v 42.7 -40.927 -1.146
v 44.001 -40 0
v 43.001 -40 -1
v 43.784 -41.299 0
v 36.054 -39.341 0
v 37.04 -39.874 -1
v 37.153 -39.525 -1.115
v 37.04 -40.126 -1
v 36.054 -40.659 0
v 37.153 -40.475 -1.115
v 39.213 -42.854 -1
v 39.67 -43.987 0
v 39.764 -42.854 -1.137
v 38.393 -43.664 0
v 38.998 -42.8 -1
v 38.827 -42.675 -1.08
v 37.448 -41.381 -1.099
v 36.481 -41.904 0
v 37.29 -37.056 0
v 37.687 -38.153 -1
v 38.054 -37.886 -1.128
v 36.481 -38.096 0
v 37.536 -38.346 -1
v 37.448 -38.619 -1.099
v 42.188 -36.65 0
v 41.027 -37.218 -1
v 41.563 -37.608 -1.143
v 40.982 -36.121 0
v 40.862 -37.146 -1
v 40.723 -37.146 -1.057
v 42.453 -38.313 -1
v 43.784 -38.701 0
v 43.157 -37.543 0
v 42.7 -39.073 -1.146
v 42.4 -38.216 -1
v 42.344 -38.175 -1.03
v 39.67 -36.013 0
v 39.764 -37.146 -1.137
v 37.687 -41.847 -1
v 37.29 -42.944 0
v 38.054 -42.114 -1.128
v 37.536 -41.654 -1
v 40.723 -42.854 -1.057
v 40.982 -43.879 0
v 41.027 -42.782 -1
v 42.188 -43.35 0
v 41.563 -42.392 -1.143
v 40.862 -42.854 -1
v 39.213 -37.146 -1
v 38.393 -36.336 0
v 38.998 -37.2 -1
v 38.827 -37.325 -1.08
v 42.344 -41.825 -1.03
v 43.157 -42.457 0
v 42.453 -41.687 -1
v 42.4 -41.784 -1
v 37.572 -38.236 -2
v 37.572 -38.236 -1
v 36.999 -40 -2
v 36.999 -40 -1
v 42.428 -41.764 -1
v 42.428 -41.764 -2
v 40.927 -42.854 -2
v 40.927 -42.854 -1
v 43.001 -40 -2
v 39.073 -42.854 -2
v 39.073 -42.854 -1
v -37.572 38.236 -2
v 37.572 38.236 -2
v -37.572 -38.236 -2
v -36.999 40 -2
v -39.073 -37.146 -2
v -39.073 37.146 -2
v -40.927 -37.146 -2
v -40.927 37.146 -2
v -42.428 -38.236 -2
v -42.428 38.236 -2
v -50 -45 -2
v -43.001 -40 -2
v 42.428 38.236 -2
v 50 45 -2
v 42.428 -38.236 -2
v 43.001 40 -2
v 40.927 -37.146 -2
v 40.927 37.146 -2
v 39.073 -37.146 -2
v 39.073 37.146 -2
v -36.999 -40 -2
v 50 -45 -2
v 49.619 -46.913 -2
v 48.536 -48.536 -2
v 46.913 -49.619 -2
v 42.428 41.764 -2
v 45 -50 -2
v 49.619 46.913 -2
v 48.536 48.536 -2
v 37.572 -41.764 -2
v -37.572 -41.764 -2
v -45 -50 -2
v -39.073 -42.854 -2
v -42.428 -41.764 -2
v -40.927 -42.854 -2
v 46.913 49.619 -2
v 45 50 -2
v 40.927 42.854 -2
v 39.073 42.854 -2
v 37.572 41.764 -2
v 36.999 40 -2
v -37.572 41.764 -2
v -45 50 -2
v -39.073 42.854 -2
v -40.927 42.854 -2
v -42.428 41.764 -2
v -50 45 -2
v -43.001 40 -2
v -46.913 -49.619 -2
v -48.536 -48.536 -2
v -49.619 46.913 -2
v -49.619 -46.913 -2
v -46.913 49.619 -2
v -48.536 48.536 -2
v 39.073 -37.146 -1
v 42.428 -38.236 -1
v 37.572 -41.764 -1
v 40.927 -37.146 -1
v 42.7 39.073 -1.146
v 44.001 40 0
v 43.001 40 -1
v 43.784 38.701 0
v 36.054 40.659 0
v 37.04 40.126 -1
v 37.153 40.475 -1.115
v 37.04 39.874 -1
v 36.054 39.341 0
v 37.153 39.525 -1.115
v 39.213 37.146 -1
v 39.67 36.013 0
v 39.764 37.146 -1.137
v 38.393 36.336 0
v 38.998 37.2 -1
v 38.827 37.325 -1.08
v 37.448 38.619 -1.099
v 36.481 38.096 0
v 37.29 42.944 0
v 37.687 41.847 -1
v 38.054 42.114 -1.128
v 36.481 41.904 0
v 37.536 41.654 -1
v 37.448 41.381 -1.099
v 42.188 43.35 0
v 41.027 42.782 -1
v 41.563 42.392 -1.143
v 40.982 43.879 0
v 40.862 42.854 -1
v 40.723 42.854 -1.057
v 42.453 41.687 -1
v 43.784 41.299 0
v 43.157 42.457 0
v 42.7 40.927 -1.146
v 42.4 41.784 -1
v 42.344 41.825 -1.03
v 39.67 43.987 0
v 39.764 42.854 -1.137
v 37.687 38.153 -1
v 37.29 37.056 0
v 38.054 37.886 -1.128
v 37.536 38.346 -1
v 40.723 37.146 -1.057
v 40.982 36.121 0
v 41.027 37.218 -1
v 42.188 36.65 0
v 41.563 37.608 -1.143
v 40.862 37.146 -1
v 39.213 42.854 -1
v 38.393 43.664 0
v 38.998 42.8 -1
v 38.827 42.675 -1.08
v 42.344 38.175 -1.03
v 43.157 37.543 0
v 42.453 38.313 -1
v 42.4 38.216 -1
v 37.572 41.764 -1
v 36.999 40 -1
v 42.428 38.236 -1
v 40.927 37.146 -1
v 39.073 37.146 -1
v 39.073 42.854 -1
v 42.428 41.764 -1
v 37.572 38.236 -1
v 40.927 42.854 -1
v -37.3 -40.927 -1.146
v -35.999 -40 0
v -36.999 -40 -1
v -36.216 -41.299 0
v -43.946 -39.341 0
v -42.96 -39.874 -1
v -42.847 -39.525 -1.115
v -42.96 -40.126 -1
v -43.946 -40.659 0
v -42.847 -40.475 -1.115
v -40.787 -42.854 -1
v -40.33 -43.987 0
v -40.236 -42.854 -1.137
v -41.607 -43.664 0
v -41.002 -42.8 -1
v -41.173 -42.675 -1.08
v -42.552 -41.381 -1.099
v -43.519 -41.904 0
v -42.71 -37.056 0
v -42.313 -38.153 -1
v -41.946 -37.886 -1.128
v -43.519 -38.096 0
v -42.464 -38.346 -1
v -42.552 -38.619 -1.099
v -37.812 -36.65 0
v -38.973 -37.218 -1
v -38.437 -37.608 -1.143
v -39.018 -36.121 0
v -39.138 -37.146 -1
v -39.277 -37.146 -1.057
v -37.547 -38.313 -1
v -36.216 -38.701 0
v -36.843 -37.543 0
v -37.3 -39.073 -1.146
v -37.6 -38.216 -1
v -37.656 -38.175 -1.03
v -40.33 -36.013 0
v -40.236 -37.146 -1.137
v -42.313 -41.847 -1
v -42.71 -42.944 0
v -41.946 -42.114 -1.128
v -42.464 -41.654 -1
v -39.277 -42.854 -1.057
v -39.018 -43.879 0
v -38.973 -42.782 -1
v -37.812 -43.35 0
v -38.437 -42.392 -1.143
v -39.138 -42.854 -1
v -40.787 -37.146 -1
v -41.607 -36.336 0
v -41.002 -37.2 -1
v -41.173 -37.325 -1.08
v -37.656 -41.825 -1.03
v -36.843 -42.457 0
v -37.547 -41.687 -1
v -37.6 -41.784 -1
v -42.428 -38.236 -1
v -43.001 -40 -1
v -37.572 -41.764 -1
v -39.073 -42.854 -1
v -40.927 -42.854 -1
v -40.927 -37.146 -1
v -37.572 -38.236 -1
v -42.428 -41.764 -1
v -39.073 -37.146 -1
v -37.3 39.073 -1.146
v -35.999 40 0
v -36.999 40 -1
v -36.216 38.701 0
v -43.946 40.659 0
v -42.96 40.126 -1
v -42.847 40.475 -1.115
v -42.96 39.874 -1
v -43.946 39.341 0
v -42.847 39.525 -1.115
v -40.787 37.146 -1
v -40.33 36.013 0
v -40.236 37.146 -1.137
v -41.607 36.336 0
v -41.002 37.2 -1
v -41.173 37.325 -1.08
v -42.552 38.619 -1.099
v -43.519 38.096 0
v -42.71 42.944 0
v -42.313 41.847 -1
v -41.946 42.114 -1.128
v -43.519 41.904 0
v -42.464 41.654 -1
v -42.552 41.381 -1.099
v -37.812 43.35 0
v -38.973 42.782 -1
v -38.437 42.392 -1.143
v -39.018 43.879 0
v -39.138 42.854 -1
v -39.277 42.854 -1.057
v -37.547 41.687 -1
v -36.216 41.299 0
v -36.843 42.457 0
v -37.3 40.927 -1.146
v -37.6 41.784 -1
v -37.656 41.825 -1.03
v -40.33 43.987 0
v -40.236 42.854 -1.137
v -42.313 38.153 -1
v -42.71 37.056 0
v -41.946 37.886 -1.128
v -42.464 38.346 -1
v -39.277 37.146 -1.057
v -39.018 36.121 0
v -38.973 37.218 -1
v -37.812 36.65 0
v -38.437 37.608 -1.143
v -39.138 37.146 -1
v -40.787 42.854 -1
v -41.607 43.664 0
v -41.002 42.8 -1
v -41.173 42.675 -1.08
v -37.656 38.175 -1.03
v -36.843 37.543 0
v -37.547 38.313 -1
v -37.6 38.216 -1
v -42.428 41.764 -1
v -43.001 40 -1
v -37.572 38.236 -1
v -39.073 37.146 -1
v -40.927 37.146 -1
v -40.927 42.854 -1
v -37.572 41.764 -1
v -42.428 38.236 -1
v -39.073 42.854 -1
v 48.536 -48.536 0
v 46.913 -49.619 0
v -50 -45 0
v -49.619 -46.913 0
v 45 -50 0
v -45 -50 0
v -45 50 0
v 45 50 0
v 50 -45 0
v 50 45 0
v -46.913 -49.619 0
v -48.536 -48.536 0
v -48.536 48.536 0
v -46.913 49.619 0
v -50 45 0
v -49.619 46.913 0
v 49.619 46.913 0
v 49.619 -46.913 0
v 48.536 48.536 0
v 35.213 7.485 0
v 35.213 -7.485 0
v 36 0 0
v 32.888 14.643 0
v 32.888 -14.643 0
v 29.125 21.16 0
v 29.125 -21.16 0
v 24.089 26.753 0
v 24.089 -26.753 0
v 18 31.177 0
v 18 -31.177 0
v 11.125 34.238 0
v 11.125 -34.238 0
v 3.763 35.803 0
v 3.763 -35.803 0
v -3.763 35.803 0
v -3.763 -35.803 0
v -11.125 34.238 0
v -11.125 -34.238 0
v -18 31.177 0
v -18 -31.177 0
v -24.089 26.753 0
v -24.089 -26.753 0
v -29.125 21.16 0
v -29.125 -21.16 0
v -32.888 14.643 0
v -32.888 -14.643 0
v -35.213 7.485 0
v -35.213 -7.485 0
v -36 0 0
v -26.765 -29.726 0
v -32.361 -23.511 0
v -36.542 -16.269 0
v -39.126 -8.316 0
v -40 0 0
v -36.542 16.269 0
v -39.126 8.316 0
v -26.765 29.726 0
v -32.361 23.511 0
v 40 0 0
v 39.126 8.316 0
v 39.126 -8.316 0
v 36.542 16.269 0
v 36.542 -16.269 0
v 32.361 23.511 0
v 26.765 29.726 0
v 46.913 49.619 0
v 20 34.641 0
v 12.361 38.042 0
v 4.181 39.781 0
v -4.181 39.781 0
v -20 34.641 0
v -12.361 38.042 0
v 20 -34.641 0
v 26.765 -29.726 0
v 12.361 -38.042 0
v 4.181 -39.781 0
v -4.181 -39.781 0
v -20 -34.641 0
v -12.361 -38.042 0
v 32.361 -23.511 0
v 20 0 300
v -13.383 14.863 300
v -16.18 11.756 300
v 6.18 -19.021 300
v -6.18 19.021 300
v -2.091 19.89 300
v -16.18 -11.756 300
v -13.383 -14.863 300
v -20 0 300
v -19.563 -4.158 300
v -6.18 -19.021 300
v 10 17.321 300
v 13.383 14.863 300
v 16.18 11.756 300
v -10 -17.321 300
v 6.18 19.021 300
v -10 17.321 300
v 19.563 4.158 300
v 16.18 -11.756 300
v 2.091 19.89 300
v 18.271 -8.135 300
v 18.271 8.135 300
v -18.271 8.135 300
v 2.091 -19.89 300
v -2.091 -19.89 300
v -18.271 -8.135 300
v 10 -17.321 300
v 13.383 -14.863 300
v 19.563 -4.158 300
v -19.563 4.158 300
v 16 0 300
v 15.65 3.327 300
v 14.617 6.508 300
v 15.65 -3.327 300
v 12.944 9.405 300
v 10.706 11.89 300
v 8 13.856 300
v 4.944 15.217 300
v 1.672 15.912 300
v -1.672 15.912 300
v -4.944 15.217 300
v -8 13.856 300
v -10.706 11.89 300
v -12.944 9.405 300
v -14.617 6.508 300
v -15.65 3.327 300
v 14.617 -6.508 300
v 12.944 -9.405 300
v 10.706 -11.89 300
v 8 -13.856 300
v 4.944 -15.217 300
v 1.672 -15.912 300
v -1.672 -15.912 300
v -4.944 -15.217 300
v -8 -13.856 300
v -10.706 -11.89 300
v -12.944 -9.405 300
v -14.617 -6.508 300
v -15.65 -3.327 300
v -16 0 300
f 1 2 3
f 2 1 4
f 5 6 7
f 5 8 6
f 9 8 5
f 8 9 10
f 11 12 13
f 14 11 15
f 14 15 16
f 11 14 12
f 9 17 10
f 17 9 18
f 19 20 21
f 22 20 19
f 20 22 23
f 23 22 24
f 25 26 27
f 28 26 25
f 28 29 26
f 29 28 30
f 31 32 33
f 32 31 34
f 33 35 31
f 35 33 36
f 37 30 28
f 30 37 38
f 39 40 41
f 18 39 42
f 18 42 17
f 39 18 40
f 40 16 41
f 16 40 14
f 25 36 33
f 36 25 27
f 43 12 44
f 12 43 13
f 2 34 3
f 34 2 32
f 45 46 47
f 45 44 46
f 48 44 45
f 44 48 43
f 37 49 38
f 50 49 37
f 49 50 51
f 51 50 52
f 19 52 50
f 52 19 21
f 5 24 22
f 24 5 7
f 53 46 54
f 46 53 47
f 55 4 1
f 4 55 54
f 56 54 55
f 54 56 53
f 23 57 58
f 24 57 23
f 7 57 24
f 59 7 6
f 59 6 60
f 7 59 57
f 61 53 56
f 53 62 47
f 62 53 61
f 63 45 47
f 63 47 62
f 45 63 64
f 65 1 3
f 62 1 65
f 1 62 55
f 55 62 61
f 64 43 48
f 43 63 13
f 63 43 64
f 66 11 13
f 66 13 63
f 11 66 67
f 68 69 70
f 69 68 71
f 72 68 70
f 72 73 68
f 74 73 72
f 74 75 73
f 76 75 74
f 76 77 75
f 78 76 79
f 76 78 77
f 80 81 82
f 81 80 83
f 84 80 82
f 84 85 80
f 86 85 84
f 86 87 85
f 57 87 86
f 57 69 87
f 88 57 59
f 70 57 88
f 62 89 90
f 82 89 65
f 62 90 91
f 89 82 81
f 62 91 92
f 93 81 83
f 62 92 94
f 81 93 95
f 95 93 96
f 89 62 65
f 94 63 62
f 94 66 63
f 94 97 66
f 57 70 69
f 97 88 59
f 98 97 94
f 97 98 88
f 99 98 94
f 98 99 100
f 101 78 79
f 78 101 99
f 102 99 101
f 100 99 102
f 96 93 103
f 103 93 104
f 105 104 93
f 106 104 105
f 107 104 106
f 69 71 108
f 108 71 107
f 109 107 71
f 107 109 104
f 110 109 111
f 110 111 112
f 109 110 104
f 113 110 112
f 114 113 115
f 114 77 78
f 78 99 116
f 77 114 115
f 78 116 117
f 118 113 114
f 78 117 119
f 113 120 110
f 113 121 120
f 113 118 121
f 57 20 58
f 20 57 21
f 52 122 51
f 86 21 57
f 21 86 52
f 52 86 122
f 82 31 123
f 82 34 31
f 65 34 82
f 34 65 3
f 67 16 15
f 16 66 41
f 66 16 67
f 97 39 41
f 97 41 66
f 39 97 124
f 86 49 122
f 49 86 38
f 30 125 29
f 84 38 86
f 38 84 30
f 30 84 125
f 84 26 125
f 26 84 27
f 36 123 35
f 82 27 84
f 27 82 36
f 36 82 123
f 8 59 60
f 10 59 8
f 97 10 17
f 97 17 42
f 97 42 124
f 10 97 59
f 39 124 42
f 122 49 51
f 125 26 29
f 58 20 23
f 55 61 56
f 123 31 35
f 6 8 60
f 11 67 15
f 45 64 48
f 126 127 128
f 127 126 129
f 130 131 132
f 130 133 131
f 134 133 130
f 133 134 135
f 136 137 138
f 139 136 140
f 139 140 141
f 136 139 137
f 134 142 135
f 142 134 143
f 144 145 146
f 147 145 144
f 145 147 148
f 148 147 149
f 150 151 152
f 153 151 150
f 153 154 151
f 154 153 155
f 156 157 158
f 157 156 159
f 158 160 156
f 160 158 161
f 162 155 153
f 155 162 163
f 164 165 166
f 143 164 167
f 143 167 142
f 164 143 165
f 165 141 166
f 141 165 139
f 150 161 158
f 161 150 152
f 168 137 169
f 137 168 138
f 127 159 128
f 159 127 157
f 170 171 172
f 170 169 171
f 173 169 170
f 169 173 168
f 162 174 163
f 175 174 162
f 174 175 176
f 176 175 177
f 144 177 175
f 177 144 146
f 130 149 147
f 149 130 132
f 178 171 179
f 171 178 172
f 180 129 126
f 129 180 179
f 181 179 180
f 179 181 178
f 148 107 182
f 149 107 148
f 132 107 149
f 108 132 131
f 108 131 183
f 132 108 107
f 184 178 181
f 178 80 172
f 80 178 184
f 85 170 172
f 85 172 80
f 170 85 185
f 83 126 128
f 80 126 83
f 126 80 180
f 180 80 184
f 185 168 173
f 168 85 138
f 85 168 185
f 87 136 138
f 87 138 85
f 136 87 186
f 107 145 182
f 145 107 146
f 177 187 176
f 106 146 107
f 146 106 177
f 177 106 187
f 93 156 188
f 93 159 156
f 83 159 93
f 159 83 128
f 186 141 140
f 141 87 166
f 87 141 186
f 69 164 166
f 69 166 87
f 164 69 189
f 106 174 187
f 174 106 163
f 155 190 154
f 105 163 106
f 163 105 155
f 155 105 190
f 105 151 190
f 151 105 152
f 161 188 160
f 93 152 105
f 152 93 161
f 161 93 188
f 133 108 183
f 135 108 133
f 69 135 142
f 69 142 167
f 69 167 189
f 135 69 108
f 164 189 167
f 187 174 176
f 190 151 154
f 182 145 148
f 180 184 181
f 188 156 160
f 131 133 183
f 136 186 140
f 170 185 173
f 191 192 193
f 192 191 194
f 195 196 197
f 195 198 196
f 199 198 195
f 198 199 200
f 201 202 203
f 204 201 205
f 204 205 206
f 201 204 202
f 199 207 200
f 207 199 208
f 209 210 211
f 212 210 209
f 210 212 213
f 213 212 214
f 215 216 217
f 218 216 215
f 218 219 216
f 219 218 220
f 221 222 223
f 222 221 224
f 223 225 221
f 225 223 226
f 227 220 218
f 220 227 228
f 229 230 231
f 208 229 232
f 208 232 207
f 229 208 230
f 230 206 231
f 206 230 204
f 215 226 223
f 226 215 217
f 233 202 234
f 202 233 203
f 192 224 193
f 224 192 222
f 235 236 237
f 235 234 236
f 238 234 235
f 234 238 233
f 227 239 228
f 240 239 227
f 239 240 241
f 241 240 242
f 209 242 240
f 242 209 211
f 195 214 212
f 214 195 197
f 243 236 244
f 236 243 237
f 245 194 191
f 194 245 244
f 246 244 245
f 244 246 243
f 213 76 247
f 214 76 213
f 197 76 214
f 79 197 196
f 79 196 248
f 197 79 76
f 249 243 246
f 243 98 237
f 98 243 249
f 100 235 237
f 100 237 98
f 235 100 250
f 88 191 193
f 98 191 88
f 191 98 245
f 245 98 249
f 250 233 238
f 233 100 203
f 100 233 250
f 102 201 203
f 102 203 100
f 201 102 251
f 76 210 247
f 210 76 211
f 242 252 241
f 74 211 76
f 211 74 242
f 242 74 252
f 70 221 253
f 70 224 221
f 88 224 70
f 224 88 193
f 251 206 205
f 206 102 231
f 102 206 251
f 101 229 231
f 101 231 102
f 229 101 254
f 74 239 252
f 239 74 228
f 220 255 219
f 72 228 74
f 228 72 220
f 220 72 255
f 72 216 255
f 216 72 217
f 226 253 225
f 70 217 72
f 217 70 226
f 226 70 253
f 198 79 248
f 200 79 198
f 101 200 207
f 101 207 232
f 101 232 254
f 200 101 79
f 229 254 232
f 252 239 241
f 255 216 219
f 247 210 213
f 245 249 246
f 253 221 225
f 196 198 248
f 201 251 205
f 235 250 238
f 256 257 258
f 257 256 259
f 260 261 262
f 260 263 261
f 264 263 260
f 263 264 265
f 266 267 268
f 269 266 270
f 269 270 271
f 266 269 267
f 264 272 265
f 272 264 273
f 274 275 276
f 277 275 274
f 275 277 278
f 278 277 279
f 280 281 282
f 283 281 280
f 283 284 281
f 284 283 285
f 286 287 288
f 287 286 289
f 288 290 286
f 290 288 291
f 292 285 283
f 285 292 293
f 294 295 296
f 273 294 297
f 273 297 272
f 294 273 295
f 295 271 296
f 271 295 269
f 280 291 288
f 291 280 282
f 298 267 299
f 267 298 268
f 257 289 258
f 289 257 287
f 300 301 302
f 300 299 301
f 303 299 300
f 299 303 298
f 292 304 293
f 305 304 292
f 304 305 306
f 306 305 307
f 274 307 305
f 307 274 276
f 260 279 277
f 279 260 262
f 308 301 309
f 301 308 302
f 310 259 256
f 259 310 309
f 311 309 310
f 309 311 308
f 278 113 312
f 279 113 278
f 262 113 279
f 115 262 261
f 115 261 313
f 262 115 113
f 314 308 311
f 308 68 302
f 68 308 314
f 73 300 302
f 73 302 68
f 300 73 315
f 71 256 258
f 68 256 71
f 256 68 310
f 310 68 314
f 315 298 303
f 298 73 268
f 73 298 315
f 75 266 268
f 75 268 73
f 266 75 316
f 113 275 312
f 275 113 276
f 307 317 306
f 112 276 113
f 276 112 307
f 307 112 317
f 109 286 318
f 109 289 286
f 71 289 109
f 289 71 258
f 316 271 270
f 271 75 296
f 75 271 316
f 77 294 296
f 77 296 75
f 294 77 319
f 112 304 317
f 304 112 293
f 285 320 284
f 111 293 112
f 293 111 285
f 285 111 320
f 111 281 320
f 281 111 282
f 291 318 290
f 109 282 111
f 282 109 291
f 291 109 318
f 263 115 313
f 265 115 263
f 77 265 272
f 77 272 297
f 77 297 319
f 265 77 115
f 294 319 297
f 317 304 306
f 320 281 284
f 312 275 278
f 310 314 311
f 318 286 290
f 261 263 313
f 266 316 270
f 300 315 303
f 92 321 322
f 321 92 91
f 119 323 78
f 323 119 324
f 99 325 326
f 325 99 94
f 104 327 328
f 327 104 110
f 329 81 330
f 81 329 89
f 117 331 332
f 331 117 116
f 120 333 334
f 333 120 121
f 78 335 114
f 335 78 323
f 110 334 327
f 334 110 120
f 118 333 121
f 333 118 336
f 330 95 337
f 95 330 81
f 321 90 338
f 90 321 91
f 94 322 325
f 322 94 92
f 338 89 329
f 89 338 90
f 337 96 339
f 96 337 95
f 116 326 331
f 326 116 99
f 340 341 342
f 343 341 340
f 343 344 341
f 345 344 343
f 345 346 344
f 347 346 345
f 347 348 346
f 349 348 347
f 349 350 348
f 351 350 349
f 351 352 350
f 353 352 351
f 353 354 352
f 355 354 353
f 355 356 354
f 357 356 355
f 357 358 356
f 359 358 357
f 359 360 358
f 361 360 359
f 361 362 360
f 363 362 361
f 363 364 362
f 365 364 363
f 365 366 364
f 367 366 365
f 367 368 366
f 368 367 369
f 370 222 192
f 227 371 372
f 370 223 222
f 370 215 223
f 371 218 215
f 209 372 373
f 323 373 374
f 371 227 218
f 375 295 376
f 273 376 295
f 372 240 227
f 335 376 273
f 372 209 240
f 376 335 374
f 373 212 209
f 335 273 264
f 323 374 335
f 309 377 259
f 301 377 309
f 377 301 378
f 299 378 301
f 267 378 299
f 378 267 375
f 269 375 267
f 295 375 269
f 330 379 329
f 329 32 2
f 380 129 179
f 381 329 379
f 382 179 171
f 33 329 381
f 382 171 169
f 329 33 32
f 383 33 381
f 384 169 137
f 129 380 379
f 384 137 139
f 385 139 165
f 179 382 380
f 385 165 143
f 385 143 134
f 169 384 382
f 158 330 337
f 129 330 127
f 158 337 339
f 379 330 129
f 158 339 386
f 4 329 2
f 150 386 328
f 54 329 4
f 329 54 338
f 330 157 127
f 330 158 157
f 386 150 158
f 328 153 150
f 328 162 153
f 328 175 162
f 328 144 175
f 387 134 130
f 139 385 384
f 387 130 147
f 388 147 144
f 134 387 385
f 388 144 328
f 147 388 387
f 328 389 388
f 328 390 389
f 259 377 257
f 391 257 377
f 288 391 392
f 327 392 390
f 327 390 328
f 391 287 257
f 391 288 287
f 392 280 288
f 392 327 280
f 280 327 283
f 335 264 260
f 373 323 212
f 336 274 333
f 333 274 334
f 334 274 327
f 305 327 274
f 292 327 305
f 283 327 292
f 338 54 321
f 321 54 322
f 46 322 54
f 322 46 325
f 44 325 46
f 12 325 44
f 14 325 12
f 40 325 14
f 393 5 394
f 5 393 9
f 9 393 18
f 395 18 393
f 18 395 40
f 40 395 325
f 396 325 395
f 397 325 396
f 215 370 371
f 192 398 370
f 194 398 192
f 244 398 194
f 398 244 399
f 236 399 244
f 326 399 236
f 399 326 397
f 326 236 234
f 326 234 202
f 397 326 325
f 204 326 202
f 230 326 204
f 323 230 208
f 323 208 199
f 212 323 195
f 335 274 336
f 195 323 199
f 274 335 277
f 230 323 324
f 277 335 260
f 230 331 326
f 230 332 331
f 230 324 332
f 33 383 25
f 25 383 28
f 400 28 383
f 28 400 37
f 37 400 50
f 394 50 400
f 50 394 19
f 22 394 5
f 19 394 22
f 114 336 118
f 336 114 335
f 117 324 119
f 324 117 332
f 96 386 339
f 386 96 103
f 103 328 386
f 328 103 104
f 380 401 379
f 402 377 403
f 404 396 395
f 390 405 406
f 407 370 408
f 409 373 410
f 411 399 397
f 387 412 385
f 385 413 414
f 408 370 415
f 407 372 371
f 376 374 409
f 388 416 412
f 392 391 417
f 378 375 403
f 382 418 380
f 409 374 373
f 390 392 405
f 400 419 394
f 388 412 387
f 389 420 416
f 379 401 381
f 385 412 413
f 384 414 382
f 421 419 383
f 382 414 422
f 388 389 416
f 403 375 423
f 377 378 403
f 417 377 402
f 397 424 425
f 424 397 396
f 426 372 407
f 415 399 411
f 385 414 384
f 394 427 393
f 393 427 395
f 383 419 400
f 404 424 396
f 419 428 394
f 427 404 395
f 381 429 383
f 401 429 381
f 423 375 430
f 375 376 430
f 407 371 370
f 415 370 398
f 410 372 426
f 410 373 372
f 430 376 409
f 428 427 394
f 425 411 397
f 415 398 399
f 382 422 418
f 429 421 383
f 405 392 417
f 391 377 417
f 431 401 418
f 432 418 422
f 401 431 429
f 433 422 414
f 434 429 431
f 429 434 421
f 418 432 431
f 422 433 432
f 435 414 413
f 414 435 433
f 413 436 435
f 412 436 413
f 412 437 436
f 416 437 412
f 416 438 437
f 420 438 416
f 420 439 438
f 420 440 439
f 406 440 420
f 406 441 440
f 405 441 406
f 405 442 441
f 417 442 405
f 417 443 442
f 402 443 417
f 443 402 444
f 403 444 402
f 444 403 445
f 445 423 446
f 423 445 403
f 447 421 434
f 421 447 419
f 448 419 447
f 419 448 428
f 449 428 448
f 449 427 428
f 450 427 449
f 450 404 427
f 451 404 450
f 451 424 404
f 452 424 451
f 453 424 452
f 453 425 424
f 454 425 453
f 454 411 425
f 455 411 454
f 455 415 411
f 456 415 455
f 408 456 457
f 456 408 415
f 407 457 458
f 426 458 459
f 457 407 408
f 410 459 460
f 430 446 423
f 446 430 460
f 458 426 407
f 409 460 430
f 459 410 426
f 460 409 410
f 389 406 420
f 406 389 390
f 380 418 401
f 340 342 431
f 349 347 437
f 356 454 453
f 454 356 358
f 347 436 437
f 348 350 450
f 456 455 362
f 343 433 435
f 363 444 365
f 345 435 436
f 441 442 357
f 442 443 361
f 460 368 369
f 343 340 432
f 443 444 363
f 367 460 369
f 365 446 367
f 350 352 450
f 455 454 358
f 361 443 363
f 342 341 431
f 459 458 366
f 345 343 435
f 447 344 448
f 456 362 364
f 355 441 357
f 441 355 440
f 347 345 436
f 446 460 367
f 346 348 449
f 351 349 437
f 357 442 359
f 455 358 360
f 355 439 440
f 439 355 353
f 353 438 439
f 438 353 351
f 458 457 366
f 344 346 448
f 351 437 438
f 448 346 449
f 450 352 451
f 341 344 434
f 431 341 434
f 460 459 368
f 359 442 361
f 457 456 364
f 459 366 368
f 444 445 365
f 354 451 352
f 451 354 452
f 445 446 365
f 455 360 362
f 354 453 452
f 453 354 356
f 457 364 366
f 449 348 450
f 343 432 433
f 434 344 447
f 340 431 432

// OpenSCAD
// file: common.scad
//
// Common
//

// Define part overlap.
cmn_OVERLAP = 0.001;
// file: drilling.scad
//
// raimund-the-juicer
//
// Copyright (c) 2020 Michael Binz
//

include <common.scad>

drilling();

// A drilling. Subtract.
module drilling(
    d = 6,
    depth = 50
)
{
    d = d + (2*cmn_OVERLAP);
    
    union ()
    {
        translate( [0, 0, (d/2) - cmn_OVERLAP ] )
        {
            cylinder(
                h=d, 
                d1=2*d,
                d2=0,
                center=true);
            
            translate( [0, 0, depth/2] )
            {
                cylinder(
                    h=depth, 
                    d=d,
                    center=true);
            }
        }
    } // union
}
// file: platte.scad
//
// raimund-the-juicer
//
// platte common part
//
// Copyright (c) 2020 Michael Binz
//

use <drilling.scad>

platte();

/*
 * @param l=60 Length in x direction.
 * @param w=40 Width in y direction.
 * @param s=2 Thickness in z direction.
 * @param drilling=6 Drilling diameter.
 */
module platte(
    l=60,
    w=40,
    s=2,
    drilling=6
)
{
    cornerRadius = 5;
    length = l;
    width = w;
    height = s;
    
    circleDiameter = 2*cornerRadius;
    h = height /2;

    difference() {
        hull() 
        {
            tlLen = (length/2) - cornerRadius;
            tlWid = (width/2) - cornerRadius;
            
            translate([tlLen,tlWid,h]) 
                cylinder(d=circleDiameter, h=height, center=true);
            translate([tlLen,-tlWid,h]) 
                cylinder(d=circleDiameter, h=height, center=true);
            translate([-tlLen,tlWid,h]) 
                cylinder(d=circleDiameter, h=height, center=true);
            translate([-tlLen,-tlWid,h]) 
                cylinder(d=circleDiameter, h=height, center=true);
        }
        union() {
            tlLen = (length/2) - circleDiameter;
            tlWid = (width/2) - circleDiameter;
            
            translate([tlLen,tlWid,-height]) 
                drilling( d=drilling, depth=h );
            translate([tlLen,-tlWid,-height]) 
                drilling( d=drilling, depth=h );
            translate([-tlLen,tlWid,-height]) 
                drilling( d=drilling, depth=h );
            translate([-tlLen,-tlWid,-height])
                drilling( d=drilling, depth=h );
        }    
    }
}
// main file
//
// raimund-the-juicer
//
// welle top-level part
//
// Copyright (c) 2020 Michael Binz
//

use <platte.scad>

tischbein();

module tischbein ()
{
    d_top = 80;
    d_bottom = 40;
    // Height
    h0 = 300;
    // Angle
    angle=0;
    thickness = 2;
    
    rotate([180,0,0]) platte(
        w=d_top+20,
        l=d_top+20,
        s=thickness );

    rotate ([angle,0,0]) {
        translate( [0, 0, 0] )
        {
            difference ()
            {
                cylinder(
                    r1=d_top/2,
                    r2=d_bottom/2,
                    h=h0 );
                cylinder(
                    r1=(d_top/2)-(2*thickness),
                    r2=(d_bottom/2)-(2*thickness),
                    h=h0 );
            }
        }
    }
}
